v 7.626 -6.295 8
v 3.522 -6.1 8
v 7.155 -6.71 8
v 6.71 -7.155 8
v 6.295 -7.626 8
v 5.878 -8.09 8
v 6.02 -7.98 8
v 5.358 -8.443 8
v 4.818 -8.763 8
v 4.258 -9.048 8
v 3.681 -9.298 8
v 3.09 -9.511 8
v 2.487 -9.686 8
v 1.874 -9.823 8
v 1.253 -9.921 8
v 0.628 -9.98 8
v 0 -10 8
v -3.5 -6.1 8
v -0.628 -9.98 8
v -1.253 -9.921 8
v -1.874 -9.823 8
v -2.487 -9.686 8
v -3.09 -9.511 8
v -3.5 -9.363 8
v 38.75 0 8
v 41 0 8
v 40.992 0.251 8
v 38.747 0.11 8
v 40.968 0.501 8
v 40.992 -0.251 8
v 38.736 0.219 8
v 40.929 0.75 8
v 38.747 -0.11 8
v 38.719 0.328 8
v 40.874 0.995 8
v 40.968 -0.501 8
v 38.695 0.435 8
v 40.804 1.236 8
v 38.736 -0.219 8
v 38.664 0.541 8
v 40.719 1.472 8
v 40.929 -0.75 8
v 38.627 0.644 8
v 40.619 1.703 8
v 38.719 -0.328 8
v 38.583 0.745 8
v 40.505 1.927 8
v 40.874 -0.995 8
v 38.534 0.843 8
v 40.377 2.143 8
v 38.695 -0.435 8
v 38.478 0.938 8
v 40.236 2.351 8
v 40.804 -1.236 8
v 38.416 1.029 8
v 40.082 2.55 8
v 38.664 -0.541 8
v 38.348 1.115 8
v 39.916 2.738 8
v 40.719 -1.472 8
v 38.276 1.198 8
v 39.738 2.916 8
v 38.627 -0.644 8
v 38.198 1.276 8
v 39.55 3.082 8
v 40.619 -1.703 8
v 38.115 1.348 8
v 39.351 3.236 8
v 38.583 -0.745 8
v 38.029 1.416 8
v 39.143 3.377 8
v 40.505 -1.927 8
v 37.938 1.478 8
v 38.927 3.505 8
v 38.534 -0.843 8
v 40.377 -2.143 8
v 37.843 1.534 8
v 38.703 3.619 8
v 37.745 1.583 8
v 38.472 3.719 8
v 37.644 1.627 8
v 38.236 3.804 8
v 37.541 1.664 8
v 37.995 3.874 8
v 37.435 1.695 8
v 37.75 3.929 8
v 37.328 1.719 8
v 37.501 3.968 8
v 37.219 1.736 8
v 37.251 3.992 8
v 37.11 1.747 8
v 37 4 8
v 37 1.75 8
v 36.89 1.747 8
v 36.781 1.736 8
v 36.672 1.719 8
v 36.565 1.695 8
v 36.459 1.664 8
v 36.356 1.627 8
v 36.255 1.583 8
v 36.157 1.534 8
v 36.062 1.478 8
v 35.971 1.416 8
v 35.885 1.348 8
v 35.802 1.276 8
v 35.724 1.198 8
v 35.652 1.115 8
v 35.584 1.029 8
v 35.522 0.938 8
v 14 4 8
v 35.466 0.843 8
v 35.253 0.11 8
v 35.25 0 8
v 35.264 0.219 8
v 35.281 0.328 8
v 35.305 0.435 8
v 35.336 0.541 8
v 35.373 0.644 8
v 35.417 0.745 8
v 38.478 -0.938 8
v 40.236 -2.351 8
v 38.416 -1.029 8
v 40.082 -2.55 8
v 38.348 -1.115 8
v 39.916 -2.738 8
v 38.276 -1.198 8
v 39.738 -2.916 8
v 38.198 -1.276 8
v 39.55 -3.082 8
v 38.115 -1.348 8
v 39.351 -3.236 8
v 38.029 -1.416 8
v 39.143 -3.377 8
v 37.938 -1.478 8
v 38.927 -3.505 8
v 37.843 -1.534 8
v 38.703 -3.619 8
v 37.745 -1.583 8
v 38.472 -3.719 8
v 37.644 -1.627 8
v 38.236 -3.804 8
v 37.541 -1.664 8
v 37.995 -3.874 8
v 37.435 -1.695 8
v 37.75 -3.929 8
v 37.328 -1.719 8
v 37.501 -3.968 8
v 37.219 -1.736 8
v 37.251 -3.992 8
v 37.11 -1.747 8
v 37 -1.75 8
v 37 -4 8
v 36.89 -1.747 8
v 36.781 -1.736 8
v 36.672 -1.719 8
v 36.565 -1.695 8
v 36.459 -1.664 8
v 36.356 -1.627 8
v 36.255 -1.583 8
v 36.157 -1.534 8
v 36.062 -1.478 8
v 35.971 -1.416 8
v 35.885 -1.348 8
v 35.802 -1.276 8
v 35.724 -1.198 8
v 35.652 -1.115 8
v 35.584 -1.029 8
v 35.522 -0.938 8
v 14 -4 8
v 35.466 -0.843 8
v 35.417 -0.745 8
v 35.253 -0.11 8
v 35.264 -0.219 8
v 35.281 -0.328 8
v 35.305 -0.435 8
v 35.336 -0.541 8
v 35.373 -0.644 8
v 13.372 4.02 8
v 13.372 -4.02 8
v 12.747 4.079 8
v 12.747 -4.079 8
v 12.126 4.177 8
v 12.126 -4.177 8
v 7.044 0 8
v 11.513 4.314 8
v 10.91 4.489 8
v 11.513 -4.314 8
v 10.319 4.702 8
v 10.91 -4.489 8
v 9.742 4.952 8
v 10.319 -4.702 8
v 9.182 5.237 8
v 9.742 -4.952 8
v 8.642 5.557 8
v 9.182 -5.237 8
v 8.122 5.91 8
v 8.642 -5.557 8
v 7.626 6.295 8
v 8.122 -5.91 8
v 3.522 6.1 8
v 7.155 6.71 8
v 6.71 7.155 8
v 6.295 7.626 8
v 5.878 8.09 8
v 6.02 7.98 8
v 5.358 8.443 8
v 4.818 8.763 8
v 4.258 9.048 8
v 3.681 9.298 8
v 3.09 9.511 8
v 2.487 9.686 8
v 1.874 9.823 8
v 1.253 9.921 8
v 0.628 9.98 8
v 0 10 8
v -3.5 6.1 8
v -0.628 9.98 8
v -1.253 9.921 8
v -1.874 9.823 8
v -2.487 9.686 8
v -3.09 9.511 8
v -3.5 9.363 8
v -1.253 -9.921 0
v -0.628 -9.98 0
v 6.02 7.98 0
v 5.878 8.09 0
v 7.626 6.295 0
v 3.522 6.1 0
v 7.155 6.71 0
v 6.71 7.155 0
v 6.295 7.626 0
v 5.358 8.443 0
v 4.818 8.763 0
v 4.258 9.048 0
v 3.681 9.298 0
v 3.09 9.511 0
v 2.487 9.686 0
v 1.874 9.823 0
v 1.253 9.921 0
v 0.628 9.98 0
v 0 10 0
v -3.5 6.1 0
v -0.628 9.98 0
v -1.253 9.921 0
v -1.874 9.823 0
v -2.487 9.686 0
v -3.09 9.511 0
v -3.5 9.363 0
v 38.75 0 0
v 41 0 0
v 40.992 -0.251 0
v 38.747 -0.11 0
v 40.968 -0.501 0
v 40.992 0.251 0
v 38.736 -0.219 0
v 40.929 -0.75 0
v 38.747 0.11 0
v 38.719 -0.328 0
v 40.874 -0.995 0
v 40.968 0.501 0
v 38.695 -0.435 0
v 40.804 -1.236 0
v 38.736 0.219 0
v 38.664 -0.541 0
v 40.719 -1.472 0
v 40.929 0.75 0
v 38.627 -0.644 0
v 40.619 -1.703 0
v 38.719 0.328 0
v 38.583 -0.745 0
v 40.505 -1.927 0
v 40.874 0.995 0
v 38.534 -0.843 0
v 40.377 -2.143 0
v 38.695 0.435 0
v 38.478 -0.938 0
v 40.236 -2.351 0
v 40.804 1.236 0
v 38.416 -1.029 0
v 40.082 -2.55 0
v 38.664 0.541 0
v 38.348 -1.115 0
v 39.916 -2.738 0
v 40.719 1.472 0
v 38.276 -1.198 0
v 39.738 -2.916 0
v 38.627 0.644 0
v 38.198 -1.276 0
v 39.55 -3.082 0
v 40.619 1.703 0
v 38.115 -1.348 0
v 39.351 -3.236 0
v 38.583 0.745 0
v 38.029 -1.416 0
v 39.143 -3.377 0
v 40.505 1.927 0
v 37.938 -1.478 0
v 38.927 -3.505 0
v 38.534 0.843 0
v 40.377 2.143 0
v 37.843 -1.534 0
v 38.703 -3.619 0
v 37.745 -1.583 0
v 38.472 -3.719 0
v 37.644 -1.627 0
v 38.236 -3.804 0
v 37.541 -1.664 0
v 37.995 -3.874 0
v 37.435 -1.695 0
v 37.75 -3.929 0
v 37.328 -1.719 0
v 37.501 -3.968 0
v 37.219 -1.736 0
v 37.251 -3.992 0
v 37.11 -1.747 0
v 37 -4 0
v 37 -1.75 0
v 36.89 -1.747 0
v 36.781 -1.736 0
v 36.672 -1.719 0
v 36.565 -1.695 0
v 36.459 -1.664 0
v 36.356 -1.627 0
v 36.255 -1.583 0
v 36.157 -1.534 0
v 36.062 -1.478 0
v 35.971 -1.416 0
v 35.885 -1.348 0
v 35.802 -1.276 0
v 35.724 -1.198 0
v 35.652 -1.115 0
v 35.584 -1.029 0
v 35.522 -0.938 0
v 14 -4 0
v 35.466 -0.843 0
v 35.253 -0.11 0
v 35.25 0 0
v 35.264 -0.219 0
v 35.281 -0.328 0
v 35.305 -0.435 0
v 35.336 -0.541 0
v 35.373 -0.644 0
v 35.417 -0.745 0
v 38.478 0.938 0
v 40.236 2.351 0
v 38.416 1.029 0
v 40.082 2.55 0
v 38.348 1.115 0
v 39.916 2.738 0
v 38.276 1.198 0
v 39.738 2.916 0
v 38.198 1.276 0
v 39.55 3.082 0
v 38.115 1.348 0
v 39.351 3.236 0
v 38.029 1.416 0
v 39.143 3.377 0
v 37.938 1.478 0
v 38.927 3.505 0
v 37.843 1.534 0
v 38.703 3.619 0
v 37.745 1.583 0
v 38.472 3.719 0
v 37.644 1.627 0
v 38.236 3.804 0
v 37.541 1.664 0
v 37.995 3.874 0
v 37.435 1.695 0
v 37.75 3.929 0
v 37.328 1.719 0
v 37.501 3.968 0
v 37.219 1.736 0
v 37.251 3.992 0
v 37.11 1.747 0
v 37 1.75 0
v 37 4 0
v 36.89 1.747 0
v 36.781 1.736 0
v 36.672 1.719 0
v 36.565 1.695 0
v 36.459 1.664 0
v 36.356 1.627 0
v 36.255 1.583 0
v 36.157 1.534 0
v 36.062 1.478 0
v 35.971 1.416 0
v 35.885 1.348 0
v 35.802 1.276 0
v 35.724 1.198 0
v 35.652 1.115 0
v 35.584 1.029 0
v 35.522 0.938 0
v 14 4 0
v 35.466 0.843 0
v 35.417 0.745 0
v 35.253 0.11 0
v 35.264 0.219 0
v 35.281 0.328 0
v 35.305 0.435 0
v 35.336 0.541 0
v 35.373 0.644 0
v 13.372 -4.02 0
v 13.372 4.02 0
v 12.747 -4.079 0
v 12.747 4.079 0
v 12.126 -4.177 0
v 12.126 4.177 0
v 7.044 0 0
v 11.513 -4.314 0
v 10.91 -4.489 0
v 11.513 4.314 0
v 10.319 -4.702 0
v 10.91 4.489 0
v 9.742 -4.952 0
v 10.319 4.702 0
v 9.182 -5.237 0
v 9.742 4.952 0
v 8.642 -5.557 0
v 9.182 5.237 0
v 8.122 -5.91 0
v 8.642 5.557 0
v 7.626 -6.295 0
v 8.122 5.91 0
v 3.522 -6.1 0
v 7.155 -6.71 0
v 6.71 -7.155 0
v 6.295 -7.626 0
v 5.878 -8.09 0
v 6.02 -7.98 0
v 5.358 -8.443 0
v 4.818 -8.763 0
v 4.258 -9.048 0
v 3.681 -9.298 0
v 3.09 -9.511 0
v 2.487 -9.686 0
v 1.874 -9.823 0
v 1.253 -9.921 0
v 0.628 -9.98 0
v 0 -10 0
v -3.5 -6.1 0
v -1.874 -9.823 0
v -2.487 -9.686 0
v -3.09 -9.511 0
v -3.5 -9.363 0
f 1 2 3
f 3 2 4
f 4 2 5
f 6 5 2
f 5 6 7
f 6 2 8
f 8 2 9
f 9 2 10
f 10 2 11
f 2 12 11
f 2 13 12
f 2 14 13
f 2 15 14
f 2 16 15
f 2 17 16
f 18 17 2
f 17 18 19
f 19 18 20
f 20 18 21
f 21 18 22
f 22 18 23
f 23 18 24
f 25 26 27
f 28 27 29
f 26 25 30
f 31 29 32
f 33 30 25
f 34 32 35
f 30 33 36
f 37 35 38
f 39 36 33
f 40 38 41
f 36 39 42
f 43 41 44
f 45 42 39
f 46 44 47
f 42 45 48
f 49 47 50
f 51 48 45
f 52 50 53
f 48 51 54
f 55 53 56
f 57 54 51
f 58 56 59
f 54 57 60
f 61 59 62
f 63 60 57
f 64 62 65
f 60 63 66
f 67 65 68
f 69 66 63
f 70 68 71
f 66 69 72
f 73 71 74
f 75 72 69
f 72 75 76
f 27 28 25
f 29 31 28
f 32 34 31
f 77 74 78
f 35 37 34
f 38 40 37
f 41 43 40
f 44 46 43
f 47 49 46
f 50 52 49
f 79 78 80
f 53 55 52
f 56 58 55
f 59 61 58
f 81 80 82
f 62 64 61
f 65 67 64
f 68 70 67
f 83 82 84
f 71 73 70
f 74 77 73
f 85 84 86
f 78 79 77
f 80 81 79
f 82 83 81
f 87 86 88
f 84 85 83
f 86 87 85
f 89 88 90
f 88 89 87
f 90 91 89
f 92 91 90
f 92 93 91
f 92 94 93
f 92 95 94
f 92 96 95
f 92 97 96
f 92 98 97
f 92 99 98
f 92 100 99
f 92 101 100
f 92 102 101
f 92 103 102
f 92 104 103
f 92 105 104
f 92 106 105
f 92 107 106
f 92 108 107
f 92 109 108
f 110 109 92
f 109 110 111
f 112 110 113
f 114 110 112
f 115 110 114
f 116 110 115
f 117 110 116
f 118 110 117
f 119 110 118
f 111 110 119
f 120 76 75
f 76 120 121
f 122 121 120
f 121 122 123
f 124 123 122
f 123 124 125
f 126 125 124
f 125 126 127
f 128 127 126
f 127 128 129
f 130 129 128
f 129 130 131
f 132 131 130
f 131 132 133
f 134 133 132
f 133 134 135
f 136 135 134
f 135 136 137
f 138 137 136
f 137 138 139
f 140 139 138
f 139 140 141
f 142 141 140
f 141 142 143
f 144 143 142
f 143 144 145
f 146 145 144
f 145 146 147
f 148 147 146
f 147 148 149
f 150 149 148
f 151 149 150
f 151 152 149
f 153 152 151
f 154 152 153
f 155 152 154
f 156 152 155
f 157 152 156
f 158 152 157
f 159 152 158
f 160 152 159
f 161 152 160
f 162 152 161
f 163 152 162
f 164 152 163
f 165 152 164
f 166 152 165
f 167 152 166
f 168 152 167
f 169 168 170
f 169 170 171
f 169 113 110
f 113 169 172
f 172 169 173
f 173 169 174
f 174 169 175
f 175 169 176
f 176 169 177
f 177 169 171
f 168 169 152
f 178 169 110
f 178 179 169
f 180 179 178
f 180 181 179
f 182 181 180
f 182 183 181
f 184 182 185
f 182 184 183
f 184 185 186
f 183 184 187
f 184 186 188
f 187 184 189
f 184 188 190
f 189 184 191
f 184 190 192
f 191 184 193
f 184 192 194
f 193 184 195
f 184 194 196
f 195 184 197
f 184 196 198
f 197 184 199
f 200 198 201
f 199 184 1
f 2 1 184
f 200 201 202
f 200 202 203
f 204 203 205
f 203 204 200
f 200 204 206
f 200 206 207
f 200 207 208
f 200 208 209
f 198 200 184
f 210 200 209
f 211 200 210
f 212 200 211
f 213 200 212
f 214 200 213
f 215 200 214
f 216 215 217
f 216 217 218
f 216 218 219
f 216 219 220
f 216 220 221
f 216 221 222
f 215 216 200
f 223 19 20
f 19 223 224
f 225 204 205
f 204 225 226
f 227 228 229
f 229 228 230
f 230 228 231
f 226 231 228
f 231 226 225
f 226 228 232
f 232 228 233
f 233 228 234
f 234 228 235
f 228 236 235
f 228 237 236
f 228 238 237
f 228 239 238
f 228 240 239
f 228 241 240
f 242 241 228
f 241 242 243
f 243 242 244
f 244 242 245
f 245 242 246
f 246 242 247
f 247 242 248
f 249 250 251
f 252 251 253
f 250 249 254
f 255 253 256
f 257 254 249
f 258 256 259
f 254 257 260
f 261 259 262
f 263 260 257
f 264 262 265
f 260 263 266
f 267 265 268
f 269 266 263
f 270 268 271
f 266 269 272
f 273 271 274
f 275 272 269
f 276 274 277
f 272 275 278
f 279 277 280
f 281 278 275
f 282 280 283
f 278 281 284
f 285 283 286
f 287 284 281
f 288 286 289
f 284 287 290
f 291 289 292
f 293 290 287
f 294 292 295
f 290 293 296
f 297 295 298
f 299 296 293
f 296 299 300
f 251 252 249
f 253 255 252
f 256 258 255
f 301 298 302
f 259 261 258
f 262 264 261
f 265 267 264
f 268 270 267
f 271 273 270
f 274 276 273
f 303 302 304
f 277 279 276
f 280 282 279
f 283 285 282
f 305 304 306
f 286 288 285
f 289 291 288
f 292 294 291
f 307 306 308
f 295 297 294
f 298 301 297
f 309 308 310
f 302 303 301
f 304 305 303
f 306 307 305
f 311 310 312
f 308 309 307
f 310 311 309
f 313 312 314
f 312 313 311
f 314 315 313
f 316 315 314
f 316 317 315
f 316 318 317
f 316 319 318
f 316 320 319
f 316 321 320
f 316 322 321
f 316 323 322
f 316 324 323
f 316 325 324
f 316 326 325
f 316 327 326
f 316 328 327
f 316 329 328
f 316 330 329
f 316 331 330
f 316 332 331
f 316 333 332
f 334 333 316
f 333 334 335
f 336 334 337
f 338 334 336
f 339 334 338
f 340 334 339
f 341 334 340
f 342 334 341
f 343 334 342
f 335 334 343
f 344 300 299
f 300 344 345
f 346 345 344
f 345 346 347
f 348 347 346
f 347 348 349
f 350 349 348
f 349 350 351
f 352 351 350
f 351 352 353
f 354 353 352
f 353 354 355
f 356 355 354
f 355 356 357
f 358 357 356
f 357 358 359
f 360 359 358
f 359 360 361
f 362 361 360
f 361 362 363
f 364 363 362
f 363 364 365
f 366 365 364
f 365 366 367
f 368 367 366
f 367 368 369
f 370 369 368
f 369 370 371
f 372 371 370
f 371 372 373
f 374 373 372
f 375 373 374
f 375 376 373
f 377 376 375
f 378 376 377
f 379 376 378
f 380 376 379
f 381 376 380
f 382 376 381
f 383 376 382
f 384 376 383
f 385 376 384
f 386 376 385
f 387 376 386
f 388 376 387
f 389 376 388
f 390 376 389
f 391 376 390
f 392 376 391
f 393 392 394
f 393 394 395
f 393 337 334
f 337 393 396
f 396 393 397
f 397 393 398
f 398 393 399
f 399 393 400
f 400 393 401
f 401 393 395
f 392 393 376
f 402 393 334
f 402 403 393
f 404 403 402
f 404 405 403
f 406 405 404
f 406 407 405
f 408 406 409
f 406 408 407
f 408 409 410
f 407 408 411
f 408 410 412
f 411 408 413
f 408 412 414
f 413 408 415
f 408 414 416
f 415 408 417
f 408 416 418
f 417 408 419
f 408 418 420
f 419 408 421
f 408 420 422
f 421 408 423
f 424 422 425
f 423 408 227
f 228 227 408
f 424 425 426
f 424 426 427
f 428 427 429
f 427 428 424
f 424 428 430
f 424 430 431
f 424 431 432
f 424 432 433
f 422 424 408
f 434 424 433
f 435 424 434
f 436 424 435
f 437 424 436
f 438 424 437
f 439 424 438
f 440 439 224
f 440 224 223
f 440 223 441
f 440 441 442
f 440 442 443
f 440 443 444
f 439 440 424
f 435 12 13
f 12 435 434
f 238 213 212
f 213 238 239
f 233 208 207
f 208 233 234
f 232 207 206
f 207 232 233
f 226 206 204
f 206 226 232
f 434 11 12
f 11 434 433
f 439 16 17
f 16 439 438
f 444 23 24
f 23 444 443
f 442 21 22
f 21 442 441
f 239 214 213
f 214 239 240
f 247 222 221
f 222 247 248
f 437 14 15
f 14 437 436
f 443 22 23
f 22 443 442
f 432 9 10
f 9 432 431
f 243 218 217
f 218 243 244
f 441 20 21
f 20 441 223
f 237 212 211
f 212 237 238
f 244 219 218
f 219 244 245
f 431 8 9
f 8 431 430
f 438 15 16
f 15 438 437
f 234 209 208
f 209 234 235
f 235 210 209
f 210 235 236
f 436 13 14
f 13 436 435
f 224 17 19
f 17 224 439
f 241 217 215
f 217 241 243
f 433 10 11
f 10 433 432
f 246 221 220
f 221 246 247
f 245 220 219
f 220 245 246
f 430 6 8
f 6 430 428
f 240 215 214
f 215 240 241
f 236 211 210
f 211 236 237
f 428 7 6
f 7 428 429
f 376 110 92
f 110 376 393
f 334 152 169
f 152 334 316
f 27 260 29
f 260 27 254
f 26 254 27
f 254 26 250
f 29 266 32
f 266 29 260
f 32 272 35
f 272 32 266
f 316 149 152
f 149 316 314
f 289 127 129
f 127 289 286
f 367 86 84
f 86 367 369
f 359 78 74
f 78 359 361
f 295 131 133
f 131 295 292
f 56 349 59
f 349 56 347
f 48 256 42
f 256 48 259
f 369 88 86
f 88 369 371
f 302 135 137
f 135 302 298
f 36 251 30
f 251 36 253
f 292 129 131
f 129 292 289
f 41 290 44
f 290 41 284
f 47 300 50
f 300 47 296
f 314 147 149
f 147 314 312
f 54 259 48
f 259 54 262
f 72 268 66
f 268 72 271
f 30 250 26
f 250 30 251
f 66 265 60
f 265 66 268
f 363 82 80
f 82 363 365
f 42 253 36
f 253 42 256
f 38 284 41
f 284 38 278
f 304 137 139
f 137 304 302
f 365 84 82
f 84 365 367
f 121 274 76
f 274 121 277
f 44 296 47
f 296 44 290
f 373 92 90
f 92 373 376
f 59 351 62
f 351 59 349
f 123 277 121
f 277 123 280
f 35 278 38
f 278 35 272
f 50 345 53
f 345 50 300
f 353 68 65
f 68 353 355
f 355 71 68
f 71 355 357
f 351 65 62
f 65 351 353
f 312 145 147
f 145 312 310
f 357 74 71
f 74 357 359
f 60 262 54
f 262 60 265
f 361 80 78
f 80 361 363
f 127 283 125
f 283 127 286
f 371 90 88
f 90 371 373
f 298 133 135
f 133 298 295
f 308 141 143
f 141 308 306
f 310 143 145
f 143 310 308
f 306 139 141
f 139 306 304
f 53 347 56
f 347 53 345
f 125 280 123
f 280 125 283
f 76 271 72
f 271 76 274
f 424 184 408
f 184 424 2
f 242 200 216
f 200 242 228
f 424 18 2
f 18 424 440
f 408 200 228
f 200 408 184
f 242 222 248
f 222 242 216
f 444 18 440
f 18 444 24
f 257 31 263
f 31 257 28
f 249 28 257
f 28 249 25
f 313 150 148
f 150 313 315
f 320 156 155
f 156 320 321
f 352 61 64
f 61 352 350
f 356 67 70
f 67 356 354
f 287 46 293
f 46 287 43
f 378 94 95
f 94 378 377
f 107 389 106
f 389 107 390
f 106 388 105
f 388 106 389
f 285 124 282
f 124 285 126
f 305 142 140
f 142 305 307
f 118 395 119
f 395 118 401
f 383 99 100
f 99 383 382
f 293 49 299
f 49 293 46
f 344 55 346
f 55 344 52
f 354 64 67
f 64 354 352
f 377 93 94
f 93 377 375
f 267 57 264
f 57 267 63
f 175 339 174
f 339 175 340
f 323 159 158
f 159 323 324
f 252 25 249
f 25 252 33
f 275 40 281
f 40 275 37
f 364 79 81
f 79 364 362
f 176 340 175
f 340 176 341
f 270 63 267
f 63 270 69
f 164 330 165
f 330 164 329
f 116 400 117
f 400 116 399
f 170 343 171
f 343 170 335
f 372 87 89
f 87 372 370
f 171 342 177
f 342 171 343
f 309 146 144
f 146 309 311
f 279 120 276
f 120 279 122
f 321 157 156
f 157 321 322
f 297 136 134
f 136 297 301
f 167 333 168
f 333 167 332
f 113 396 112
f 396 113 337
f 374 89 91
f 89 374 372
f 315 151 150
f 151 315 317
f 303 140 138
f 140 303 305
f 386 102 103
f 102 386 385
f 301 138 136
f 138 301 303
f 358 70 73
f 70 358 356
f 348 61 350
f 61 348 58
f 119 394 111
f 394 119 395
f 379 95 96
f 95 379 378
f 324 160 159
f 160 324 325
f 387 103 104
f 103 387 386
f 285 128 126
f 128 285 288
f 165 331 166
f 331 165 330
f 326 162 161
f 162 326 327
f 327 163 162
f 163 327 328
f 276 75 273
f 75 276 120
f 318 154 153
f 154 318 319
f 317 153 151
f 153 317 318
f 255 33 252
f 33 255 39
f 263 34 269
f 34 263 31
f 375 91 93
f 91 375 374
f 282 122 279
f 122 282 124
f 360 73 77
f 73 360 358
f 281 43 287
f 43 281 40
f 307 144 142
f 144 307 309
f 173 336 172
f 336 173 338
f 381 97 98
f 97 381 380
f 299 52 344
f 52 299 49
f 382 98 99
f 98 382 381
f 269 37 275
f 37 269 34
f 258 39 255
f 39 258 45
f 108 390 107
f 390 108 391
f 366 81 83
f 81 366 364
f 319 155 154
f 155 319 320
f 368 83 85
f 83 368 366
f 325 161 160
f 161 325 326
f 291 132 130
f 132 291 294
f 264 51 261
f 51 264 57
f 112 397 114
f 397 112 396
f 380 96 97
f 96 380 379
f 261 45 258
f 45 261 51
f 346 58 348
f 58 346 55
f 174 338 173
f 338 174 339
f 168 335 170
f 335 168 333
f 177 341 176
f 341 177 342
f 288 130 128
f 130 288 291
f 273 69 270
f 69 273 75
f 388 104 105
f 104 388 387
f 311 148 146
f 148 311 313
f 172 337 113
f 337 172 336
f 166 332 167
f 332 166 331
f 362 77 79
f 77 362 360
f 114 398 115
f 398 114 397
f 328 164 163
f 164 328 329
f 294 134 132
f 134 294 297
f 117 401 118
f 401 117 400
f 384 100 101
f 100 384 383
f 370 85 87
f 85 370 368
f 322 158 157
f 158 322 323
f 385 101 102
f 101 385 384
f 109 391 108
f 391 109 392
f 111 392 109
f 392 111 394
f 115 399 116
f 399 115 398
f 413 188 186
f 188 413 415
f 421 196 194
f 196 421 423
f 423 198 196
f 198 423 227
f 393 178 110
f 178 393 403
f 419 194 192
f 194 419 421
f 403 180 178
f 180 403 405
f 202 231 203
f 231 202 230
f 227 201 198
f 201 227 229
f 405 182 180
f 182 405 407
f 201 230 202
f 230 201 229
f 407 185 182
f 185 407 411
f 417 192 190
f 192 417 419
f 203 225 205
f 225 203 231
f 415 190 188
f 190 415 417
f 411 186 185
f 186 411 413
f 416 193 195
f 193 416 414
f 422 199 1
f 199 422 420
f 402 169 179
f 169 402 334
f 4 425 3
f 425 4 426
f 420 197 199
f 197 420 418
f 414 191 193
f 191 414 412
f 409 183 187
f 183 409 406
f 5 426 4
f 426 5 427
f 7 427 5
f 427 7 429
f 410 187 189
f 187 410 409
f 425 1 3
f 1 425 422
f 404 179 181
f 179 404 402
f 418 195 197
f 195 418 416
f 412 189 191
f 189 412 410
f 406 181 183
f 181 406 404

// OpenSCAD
/*
  Sodastream-Easy Schraubenschlüssel
  um Anziehen der (!) Verbindungsmutter.
  
  Ein simpler 12 mm Schlüssel.
  
  Theoretisch könnten ich einen Schlüssel aus dem Werkzeugkasten
  nutzen. Andererseits kann dieser Schlüssel als Dauerwerkzeug am
  Gerät verbleiben. So viel praktischer.
*/
$fn = $preview ? 20 : 100;

aussendm = 20.0;
dicke = 8.0;
sw = 12.2;
stielbreite = 8.0;

difference() {
    union() {
        cylinder(d=aussendm,h=dicke);
        
        color(["blue"])
        translate([7,-stielbreite/2.0,0])
        cube([30,stielbreite,dicke]);
        
        translate([7+30,0,0])
        cylinder(d=stielbreite,h=dicke);
        
        translate([0,-7.0,0])
        cube([14,14,dicke]);
    }
    
    union(){
        color("purple") 
        translate([0,0,-1.0])
        linear_extrude(dicke+2.0) 
        circle(sw/2.0/cos(180/6), $fn=6);

        color("red")
        translate([-33.5,-15,-1])
        cube([30,30,dicke+2.0]);

        // Öse
        translate([7+30,0,-1])
        cylinder(d=3.5,h=dicke+2.0);

        // Rundung
        translate([14,14,-1.0])
        cylinder(d=20,h=dicke+2);
        translate([14,-14,-1.0])
        cylinder(d=20,h=dicke+2);
    }
}
